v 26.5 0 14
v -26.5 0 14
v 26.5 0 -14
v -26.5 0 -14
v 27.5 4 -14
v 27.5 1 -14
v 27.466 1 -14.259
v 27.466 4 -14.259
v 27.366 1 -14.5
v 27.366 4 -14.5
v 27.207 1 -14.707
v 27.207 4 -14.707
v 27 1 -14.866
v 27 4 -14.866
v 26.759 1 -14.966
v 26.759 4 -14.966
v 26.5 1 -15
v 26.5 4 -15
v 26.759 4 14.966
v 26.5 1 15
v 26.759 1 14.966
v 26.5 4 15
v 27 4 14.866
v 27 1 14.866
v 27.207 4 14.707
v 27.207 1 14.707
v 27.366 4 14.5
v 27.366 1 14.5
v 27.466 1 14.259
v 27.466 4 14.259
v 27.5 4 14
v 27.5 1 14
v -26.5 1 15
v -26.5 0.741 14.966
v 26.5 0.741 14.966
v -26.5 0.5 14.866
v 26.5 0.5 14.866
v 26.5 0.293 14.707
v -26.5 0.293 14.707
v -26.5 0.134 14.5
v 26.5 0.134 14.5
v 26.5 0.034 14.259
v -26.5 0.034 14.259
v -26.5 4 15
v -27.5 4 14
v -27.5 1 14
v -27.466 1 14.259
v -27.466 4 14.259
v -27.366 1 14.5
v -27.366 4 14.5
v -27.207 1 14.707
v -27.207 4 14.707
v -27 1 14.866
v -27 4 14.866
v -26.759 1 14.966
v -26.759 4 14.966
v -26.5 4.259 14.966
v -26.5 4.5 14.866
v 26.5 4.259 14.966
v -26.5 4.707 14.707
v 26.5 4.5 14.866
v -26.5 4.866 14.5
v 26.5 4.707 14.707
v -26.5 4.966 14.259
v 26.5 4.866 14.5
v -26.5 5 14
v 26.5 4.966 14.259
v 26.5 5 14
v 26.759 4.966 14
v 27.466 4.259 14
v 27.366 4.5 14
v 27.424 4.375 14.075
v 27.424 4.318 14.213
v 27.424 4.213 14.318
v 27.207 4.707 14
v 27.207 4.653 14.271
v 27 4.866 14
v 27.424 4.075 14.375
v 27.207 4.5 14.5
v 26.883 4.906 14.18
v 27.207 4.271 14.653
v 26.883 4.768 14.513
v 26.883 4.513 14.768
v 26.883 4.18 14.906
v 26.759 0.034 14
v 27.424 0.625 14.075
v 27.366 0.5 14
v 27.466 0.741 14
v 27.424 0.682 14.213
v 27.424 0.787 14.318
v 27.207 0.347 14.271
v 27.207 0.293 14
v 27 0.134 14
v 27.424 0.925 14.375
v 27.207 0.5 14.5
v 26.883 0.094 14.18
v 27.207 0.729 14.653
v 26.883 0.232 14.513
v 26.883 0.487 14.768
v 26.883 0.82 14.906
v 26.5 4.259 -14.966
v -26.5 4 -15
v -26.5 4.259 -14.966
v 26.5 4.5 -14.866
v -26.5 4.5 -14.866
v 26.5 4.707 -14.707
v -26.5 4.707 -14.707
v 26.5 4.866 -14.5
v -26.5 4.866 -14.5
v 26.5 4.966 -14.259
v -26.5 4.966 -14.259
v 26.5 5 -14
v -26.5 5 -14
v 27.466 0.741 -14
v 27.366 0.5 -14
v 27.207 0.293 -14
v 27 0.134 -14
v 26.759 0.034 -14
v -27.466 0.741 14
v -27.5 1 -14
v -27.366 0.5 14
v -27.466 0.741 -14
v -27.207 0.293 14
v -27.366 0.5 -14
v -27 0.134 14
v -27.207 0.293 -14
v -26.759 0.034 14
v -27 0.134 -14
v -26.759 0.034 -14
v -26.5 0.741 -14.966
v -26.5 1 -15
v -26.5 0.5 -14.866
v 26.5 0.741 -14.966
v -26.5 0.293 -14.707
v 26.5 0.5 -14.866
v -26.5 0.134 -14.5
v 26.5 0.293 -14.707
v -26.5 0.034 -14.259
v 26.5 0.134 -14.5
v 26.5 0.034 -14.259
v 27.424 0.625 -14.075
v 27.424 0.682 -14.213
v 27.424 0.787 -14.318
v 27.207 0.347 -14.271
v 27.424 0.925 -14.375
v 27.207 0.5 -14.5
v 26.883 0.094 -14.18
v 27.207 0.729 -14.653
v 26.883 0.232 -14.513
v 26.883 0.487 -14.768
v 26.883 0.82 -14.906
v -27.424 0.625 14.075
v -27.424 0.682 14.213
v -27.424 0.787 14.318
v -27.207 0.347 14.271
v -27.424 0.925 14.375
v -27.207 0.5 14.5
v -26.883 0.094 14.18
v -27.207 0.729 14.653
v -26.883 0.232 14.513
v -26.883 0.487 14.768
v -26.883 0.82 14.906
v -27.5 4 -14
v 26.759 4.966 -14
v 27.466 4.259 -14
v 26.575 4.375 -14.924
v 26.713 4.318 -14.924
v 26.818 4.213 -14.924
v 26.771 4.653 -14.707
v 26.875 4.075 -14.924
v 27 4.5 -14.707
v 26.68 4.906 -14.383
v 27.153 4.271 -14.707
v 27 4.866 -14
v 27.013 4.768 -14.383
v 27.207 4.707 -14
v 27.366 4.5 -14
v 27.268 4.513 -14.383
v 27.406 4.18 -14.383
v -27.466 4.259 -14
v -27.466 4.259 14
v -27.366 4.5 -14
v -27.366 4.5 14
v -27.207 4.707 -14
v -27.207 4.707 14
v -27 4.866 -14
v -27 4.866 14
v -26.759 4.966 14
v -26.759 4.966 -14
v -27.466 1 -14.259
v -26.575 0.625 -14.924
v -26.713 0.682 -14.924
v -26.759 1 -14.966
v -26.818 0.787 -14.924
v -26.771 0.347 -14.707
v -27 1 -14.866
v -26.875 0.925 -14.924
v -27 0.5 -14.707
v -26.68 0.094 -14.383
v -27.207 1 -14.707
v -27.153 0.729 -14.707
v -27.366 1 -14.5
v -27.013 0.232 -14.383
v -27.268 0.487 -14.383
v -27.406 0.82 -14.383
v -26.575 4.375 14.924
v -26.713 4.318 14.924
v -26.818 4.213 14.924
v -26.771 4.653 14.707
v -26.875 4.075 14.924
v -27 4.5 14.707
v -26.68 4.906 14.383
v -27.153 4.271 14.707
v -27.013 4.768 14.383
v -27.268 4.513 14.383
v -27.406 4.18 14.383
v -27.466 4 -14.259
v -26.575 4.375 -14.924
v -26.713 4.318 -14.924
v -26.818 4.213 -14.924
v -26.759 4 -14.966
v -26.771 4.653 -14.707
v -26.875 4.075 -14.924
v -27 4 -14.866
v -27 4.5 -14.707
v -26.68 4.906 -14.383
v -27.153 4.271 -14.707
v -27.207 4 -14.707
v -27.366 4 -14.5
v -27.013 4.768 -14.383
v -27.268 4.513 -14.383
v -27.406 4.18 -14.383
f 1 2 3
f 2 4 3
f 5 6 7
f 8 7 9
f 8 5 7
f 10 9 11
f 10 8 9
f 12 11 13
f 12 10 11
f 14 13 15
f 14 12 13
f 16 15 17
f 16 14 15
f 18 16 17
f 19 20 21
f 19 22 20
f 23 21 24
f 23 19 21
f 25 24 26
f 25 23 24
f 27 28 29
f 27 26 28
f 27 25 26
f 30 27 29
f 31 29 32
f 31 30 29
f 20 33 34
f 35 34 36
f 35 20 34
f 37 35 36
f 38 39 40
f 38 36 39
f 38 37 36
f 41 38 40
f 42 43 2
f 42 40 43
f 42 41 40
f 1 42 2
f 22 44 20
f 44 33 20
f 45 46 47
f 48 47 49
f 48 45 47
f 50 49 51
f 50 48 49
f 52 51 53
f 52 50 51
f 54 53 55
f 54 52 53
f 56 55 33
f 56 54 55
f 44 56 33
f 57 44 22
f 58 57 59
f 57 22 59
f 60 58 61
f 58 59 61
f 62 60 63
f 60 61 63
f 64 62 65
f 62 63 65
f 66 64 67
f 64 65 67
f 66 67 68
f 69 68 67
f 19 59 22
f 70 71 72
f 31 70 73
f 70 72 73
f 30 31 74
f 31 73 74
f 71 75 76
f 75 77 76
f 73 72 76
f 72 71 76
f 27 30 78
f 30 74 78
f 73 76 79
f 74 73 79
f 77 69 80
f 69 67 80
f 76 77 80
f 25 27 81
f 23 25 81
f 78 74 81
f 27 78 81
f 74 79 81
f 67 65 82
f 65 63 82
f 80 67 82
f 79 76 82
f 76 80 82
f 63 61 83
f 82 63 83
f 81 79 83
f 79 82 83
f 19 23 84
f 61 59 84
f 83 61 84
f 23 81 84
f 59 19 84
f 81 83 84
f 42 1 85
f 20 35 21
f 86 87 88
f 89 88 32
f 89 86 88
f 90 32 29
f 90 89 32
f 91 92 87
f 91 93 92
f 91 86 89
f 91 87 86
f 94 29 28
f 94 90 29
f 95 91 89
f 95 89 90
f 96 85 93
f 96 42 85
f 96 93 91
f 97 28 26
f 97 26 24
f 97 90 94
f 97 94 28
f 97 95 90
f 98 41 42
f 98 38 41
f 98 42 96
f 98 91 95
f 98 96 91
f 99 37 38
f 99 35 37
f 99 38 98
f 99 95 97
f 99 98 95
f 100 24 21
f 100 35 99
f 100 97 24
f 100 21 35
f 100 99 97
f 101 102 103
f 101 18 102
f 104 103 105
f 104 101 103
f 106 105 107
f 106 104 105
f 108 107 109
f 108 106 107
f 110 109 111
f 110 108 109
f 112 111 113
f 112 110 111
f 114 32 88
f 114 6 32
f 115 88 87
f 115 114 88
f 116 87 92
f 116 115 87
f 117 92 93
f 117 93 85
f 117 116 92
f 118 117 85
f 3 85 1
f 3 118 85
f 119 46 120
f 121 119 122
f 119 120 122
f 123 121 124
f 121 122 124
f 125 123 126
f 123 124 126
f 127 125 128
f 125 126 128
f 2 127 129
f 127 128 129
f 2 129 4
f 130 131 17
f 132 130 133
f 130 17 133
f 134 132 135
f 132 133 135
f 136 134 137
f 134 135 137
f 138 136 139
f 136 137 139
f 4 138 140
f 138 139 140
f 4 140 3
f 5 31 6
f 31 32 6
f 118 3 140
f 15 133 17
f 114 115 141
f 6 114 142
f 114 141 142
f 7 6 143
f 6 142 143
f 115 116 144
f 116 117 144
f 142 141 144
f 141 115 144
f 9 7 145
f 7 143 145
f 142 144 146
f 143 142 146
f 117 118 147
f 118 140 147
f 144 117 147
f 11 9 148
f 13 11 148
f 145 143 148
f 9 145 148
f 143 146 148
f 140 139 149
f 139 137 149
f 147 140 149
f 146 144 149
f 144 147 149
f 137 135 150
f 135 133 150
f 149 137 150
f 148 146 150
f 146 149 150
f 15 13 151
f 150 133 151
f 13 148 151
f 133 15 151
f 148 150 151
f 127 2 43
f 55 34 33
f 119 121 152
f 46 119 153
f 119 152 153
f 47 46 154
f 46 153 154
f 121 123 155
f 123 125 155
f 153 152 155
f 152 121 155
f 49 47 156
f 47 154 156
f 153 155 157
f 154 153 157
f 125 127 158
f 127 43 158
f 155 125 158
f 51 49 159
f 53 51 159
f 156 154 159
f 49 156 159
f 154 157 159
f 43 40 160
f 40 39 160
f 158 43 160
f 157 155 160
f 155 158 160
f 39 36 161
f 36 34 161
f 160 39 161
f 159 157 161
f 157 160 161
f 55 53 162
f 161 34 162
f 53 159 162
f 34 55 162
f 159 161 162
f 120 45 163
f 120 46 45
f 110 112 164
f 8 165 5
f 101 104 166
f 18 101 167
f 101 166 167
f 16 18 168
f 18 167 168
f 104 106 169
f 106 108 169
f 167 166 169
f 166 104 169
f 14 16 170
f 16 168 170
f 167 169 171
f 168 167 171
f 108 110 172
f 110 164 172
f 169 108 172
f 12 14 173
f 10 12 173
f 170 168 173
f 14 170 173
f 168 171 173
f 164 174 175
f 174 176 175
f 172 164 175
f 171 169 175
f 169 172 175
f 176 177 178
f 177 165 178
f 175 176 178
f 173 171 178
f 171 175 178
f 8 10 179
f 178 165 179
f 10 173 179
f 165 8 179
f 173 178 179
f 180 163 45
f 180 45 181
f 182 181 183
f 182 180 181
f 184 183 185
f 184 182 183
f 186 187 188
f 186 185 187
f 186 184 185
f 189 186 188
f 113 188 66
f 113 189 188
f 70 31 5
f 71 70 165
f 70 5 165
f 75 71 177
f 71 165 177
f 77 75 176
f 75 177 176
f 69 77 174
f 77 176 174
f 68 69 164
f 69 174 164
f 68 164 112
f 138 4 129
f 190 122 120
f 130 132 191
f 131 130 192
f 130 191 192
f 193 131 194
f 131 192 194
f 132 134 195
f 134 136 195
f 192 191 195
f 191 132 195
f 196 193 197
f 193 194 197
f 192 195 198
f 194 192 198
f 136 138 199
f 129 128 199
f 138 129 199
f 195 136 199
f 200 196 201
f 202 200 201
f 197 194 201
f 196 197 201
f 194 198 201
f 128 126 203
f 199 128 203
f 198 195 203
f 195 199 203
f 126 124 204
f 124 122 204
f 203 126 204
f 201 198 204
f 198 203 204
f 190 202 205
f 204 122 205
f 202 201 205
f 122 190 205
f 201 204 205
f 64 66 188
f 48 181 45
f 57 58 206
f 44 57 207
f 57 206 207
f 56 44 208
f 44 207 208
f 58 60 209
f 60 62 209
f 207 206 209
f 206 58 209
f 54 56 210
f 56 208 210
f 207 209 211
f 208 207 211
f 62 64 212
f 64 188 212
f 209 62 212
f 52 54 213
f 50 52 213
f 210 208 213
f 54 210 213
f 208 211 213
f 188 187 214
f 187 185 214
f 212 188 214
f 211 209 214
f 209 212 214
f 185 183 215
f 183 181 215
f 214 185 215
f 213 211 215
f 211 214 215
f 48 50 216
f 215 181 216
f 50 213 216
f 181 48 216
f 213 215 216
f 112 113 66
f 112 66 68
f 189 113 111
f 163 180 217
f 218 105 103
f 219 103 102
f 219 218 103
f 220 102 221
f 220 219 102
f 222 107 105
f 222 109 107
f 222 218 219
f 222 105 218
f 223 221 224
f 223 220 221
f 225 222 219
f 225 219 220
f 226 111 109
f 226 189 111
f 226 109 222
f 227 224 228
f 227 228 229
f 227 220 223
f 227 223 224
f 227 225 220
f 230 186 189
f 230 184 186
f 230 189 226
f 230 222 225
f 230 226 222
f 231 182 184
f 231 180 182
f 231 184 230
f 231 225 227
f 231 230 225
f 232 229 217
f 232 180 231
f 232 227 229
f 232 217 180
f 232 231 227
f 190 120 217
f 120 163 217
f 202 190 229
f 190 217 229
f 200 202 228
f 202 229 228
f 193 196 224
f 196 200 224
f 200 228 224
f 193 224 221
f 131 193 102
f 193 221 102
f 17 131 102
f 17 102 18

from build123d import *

# Parameters (mm, degrees)
SKETCH1_W   = 55
SKETCH1_H   = 30
SHAPE_DEPTH = 5
FILLETS_R   = 1


with BuildPart() as part:
    # Sketch1 → Shape (new body)
    with BuildSketch(Plane(origin=(0, 0, 0), x_dir=(1, 0, 0), z_dir=(0, 1, 0))):
        Rectangle(SKETCH1_W, SKETCH1_H)
    extrude(amount=SHAPE_DEPTH)

    # Fillets
    fillets_edges = [part.edges().sort_by_distance(p)[0] for p in [
        (-27.5, 5, 0),
        (0, 5, 15),
        (27.5, 5, 0),
        (0, 0, 15),
        (-27.5, 0, 0),
        (0, 0, -15),
        (27.5, 0, 0),
        (0, 5, -15),
        (27.5, 2.5, 15),
        (-27.5, 2.5, 15),
        (-27.5, 2.5, -15),
        (27.5, 2.5, -15),
    ]]
    fillet(fillets_edges, radius=FILLETS_R)


solid = part.part
